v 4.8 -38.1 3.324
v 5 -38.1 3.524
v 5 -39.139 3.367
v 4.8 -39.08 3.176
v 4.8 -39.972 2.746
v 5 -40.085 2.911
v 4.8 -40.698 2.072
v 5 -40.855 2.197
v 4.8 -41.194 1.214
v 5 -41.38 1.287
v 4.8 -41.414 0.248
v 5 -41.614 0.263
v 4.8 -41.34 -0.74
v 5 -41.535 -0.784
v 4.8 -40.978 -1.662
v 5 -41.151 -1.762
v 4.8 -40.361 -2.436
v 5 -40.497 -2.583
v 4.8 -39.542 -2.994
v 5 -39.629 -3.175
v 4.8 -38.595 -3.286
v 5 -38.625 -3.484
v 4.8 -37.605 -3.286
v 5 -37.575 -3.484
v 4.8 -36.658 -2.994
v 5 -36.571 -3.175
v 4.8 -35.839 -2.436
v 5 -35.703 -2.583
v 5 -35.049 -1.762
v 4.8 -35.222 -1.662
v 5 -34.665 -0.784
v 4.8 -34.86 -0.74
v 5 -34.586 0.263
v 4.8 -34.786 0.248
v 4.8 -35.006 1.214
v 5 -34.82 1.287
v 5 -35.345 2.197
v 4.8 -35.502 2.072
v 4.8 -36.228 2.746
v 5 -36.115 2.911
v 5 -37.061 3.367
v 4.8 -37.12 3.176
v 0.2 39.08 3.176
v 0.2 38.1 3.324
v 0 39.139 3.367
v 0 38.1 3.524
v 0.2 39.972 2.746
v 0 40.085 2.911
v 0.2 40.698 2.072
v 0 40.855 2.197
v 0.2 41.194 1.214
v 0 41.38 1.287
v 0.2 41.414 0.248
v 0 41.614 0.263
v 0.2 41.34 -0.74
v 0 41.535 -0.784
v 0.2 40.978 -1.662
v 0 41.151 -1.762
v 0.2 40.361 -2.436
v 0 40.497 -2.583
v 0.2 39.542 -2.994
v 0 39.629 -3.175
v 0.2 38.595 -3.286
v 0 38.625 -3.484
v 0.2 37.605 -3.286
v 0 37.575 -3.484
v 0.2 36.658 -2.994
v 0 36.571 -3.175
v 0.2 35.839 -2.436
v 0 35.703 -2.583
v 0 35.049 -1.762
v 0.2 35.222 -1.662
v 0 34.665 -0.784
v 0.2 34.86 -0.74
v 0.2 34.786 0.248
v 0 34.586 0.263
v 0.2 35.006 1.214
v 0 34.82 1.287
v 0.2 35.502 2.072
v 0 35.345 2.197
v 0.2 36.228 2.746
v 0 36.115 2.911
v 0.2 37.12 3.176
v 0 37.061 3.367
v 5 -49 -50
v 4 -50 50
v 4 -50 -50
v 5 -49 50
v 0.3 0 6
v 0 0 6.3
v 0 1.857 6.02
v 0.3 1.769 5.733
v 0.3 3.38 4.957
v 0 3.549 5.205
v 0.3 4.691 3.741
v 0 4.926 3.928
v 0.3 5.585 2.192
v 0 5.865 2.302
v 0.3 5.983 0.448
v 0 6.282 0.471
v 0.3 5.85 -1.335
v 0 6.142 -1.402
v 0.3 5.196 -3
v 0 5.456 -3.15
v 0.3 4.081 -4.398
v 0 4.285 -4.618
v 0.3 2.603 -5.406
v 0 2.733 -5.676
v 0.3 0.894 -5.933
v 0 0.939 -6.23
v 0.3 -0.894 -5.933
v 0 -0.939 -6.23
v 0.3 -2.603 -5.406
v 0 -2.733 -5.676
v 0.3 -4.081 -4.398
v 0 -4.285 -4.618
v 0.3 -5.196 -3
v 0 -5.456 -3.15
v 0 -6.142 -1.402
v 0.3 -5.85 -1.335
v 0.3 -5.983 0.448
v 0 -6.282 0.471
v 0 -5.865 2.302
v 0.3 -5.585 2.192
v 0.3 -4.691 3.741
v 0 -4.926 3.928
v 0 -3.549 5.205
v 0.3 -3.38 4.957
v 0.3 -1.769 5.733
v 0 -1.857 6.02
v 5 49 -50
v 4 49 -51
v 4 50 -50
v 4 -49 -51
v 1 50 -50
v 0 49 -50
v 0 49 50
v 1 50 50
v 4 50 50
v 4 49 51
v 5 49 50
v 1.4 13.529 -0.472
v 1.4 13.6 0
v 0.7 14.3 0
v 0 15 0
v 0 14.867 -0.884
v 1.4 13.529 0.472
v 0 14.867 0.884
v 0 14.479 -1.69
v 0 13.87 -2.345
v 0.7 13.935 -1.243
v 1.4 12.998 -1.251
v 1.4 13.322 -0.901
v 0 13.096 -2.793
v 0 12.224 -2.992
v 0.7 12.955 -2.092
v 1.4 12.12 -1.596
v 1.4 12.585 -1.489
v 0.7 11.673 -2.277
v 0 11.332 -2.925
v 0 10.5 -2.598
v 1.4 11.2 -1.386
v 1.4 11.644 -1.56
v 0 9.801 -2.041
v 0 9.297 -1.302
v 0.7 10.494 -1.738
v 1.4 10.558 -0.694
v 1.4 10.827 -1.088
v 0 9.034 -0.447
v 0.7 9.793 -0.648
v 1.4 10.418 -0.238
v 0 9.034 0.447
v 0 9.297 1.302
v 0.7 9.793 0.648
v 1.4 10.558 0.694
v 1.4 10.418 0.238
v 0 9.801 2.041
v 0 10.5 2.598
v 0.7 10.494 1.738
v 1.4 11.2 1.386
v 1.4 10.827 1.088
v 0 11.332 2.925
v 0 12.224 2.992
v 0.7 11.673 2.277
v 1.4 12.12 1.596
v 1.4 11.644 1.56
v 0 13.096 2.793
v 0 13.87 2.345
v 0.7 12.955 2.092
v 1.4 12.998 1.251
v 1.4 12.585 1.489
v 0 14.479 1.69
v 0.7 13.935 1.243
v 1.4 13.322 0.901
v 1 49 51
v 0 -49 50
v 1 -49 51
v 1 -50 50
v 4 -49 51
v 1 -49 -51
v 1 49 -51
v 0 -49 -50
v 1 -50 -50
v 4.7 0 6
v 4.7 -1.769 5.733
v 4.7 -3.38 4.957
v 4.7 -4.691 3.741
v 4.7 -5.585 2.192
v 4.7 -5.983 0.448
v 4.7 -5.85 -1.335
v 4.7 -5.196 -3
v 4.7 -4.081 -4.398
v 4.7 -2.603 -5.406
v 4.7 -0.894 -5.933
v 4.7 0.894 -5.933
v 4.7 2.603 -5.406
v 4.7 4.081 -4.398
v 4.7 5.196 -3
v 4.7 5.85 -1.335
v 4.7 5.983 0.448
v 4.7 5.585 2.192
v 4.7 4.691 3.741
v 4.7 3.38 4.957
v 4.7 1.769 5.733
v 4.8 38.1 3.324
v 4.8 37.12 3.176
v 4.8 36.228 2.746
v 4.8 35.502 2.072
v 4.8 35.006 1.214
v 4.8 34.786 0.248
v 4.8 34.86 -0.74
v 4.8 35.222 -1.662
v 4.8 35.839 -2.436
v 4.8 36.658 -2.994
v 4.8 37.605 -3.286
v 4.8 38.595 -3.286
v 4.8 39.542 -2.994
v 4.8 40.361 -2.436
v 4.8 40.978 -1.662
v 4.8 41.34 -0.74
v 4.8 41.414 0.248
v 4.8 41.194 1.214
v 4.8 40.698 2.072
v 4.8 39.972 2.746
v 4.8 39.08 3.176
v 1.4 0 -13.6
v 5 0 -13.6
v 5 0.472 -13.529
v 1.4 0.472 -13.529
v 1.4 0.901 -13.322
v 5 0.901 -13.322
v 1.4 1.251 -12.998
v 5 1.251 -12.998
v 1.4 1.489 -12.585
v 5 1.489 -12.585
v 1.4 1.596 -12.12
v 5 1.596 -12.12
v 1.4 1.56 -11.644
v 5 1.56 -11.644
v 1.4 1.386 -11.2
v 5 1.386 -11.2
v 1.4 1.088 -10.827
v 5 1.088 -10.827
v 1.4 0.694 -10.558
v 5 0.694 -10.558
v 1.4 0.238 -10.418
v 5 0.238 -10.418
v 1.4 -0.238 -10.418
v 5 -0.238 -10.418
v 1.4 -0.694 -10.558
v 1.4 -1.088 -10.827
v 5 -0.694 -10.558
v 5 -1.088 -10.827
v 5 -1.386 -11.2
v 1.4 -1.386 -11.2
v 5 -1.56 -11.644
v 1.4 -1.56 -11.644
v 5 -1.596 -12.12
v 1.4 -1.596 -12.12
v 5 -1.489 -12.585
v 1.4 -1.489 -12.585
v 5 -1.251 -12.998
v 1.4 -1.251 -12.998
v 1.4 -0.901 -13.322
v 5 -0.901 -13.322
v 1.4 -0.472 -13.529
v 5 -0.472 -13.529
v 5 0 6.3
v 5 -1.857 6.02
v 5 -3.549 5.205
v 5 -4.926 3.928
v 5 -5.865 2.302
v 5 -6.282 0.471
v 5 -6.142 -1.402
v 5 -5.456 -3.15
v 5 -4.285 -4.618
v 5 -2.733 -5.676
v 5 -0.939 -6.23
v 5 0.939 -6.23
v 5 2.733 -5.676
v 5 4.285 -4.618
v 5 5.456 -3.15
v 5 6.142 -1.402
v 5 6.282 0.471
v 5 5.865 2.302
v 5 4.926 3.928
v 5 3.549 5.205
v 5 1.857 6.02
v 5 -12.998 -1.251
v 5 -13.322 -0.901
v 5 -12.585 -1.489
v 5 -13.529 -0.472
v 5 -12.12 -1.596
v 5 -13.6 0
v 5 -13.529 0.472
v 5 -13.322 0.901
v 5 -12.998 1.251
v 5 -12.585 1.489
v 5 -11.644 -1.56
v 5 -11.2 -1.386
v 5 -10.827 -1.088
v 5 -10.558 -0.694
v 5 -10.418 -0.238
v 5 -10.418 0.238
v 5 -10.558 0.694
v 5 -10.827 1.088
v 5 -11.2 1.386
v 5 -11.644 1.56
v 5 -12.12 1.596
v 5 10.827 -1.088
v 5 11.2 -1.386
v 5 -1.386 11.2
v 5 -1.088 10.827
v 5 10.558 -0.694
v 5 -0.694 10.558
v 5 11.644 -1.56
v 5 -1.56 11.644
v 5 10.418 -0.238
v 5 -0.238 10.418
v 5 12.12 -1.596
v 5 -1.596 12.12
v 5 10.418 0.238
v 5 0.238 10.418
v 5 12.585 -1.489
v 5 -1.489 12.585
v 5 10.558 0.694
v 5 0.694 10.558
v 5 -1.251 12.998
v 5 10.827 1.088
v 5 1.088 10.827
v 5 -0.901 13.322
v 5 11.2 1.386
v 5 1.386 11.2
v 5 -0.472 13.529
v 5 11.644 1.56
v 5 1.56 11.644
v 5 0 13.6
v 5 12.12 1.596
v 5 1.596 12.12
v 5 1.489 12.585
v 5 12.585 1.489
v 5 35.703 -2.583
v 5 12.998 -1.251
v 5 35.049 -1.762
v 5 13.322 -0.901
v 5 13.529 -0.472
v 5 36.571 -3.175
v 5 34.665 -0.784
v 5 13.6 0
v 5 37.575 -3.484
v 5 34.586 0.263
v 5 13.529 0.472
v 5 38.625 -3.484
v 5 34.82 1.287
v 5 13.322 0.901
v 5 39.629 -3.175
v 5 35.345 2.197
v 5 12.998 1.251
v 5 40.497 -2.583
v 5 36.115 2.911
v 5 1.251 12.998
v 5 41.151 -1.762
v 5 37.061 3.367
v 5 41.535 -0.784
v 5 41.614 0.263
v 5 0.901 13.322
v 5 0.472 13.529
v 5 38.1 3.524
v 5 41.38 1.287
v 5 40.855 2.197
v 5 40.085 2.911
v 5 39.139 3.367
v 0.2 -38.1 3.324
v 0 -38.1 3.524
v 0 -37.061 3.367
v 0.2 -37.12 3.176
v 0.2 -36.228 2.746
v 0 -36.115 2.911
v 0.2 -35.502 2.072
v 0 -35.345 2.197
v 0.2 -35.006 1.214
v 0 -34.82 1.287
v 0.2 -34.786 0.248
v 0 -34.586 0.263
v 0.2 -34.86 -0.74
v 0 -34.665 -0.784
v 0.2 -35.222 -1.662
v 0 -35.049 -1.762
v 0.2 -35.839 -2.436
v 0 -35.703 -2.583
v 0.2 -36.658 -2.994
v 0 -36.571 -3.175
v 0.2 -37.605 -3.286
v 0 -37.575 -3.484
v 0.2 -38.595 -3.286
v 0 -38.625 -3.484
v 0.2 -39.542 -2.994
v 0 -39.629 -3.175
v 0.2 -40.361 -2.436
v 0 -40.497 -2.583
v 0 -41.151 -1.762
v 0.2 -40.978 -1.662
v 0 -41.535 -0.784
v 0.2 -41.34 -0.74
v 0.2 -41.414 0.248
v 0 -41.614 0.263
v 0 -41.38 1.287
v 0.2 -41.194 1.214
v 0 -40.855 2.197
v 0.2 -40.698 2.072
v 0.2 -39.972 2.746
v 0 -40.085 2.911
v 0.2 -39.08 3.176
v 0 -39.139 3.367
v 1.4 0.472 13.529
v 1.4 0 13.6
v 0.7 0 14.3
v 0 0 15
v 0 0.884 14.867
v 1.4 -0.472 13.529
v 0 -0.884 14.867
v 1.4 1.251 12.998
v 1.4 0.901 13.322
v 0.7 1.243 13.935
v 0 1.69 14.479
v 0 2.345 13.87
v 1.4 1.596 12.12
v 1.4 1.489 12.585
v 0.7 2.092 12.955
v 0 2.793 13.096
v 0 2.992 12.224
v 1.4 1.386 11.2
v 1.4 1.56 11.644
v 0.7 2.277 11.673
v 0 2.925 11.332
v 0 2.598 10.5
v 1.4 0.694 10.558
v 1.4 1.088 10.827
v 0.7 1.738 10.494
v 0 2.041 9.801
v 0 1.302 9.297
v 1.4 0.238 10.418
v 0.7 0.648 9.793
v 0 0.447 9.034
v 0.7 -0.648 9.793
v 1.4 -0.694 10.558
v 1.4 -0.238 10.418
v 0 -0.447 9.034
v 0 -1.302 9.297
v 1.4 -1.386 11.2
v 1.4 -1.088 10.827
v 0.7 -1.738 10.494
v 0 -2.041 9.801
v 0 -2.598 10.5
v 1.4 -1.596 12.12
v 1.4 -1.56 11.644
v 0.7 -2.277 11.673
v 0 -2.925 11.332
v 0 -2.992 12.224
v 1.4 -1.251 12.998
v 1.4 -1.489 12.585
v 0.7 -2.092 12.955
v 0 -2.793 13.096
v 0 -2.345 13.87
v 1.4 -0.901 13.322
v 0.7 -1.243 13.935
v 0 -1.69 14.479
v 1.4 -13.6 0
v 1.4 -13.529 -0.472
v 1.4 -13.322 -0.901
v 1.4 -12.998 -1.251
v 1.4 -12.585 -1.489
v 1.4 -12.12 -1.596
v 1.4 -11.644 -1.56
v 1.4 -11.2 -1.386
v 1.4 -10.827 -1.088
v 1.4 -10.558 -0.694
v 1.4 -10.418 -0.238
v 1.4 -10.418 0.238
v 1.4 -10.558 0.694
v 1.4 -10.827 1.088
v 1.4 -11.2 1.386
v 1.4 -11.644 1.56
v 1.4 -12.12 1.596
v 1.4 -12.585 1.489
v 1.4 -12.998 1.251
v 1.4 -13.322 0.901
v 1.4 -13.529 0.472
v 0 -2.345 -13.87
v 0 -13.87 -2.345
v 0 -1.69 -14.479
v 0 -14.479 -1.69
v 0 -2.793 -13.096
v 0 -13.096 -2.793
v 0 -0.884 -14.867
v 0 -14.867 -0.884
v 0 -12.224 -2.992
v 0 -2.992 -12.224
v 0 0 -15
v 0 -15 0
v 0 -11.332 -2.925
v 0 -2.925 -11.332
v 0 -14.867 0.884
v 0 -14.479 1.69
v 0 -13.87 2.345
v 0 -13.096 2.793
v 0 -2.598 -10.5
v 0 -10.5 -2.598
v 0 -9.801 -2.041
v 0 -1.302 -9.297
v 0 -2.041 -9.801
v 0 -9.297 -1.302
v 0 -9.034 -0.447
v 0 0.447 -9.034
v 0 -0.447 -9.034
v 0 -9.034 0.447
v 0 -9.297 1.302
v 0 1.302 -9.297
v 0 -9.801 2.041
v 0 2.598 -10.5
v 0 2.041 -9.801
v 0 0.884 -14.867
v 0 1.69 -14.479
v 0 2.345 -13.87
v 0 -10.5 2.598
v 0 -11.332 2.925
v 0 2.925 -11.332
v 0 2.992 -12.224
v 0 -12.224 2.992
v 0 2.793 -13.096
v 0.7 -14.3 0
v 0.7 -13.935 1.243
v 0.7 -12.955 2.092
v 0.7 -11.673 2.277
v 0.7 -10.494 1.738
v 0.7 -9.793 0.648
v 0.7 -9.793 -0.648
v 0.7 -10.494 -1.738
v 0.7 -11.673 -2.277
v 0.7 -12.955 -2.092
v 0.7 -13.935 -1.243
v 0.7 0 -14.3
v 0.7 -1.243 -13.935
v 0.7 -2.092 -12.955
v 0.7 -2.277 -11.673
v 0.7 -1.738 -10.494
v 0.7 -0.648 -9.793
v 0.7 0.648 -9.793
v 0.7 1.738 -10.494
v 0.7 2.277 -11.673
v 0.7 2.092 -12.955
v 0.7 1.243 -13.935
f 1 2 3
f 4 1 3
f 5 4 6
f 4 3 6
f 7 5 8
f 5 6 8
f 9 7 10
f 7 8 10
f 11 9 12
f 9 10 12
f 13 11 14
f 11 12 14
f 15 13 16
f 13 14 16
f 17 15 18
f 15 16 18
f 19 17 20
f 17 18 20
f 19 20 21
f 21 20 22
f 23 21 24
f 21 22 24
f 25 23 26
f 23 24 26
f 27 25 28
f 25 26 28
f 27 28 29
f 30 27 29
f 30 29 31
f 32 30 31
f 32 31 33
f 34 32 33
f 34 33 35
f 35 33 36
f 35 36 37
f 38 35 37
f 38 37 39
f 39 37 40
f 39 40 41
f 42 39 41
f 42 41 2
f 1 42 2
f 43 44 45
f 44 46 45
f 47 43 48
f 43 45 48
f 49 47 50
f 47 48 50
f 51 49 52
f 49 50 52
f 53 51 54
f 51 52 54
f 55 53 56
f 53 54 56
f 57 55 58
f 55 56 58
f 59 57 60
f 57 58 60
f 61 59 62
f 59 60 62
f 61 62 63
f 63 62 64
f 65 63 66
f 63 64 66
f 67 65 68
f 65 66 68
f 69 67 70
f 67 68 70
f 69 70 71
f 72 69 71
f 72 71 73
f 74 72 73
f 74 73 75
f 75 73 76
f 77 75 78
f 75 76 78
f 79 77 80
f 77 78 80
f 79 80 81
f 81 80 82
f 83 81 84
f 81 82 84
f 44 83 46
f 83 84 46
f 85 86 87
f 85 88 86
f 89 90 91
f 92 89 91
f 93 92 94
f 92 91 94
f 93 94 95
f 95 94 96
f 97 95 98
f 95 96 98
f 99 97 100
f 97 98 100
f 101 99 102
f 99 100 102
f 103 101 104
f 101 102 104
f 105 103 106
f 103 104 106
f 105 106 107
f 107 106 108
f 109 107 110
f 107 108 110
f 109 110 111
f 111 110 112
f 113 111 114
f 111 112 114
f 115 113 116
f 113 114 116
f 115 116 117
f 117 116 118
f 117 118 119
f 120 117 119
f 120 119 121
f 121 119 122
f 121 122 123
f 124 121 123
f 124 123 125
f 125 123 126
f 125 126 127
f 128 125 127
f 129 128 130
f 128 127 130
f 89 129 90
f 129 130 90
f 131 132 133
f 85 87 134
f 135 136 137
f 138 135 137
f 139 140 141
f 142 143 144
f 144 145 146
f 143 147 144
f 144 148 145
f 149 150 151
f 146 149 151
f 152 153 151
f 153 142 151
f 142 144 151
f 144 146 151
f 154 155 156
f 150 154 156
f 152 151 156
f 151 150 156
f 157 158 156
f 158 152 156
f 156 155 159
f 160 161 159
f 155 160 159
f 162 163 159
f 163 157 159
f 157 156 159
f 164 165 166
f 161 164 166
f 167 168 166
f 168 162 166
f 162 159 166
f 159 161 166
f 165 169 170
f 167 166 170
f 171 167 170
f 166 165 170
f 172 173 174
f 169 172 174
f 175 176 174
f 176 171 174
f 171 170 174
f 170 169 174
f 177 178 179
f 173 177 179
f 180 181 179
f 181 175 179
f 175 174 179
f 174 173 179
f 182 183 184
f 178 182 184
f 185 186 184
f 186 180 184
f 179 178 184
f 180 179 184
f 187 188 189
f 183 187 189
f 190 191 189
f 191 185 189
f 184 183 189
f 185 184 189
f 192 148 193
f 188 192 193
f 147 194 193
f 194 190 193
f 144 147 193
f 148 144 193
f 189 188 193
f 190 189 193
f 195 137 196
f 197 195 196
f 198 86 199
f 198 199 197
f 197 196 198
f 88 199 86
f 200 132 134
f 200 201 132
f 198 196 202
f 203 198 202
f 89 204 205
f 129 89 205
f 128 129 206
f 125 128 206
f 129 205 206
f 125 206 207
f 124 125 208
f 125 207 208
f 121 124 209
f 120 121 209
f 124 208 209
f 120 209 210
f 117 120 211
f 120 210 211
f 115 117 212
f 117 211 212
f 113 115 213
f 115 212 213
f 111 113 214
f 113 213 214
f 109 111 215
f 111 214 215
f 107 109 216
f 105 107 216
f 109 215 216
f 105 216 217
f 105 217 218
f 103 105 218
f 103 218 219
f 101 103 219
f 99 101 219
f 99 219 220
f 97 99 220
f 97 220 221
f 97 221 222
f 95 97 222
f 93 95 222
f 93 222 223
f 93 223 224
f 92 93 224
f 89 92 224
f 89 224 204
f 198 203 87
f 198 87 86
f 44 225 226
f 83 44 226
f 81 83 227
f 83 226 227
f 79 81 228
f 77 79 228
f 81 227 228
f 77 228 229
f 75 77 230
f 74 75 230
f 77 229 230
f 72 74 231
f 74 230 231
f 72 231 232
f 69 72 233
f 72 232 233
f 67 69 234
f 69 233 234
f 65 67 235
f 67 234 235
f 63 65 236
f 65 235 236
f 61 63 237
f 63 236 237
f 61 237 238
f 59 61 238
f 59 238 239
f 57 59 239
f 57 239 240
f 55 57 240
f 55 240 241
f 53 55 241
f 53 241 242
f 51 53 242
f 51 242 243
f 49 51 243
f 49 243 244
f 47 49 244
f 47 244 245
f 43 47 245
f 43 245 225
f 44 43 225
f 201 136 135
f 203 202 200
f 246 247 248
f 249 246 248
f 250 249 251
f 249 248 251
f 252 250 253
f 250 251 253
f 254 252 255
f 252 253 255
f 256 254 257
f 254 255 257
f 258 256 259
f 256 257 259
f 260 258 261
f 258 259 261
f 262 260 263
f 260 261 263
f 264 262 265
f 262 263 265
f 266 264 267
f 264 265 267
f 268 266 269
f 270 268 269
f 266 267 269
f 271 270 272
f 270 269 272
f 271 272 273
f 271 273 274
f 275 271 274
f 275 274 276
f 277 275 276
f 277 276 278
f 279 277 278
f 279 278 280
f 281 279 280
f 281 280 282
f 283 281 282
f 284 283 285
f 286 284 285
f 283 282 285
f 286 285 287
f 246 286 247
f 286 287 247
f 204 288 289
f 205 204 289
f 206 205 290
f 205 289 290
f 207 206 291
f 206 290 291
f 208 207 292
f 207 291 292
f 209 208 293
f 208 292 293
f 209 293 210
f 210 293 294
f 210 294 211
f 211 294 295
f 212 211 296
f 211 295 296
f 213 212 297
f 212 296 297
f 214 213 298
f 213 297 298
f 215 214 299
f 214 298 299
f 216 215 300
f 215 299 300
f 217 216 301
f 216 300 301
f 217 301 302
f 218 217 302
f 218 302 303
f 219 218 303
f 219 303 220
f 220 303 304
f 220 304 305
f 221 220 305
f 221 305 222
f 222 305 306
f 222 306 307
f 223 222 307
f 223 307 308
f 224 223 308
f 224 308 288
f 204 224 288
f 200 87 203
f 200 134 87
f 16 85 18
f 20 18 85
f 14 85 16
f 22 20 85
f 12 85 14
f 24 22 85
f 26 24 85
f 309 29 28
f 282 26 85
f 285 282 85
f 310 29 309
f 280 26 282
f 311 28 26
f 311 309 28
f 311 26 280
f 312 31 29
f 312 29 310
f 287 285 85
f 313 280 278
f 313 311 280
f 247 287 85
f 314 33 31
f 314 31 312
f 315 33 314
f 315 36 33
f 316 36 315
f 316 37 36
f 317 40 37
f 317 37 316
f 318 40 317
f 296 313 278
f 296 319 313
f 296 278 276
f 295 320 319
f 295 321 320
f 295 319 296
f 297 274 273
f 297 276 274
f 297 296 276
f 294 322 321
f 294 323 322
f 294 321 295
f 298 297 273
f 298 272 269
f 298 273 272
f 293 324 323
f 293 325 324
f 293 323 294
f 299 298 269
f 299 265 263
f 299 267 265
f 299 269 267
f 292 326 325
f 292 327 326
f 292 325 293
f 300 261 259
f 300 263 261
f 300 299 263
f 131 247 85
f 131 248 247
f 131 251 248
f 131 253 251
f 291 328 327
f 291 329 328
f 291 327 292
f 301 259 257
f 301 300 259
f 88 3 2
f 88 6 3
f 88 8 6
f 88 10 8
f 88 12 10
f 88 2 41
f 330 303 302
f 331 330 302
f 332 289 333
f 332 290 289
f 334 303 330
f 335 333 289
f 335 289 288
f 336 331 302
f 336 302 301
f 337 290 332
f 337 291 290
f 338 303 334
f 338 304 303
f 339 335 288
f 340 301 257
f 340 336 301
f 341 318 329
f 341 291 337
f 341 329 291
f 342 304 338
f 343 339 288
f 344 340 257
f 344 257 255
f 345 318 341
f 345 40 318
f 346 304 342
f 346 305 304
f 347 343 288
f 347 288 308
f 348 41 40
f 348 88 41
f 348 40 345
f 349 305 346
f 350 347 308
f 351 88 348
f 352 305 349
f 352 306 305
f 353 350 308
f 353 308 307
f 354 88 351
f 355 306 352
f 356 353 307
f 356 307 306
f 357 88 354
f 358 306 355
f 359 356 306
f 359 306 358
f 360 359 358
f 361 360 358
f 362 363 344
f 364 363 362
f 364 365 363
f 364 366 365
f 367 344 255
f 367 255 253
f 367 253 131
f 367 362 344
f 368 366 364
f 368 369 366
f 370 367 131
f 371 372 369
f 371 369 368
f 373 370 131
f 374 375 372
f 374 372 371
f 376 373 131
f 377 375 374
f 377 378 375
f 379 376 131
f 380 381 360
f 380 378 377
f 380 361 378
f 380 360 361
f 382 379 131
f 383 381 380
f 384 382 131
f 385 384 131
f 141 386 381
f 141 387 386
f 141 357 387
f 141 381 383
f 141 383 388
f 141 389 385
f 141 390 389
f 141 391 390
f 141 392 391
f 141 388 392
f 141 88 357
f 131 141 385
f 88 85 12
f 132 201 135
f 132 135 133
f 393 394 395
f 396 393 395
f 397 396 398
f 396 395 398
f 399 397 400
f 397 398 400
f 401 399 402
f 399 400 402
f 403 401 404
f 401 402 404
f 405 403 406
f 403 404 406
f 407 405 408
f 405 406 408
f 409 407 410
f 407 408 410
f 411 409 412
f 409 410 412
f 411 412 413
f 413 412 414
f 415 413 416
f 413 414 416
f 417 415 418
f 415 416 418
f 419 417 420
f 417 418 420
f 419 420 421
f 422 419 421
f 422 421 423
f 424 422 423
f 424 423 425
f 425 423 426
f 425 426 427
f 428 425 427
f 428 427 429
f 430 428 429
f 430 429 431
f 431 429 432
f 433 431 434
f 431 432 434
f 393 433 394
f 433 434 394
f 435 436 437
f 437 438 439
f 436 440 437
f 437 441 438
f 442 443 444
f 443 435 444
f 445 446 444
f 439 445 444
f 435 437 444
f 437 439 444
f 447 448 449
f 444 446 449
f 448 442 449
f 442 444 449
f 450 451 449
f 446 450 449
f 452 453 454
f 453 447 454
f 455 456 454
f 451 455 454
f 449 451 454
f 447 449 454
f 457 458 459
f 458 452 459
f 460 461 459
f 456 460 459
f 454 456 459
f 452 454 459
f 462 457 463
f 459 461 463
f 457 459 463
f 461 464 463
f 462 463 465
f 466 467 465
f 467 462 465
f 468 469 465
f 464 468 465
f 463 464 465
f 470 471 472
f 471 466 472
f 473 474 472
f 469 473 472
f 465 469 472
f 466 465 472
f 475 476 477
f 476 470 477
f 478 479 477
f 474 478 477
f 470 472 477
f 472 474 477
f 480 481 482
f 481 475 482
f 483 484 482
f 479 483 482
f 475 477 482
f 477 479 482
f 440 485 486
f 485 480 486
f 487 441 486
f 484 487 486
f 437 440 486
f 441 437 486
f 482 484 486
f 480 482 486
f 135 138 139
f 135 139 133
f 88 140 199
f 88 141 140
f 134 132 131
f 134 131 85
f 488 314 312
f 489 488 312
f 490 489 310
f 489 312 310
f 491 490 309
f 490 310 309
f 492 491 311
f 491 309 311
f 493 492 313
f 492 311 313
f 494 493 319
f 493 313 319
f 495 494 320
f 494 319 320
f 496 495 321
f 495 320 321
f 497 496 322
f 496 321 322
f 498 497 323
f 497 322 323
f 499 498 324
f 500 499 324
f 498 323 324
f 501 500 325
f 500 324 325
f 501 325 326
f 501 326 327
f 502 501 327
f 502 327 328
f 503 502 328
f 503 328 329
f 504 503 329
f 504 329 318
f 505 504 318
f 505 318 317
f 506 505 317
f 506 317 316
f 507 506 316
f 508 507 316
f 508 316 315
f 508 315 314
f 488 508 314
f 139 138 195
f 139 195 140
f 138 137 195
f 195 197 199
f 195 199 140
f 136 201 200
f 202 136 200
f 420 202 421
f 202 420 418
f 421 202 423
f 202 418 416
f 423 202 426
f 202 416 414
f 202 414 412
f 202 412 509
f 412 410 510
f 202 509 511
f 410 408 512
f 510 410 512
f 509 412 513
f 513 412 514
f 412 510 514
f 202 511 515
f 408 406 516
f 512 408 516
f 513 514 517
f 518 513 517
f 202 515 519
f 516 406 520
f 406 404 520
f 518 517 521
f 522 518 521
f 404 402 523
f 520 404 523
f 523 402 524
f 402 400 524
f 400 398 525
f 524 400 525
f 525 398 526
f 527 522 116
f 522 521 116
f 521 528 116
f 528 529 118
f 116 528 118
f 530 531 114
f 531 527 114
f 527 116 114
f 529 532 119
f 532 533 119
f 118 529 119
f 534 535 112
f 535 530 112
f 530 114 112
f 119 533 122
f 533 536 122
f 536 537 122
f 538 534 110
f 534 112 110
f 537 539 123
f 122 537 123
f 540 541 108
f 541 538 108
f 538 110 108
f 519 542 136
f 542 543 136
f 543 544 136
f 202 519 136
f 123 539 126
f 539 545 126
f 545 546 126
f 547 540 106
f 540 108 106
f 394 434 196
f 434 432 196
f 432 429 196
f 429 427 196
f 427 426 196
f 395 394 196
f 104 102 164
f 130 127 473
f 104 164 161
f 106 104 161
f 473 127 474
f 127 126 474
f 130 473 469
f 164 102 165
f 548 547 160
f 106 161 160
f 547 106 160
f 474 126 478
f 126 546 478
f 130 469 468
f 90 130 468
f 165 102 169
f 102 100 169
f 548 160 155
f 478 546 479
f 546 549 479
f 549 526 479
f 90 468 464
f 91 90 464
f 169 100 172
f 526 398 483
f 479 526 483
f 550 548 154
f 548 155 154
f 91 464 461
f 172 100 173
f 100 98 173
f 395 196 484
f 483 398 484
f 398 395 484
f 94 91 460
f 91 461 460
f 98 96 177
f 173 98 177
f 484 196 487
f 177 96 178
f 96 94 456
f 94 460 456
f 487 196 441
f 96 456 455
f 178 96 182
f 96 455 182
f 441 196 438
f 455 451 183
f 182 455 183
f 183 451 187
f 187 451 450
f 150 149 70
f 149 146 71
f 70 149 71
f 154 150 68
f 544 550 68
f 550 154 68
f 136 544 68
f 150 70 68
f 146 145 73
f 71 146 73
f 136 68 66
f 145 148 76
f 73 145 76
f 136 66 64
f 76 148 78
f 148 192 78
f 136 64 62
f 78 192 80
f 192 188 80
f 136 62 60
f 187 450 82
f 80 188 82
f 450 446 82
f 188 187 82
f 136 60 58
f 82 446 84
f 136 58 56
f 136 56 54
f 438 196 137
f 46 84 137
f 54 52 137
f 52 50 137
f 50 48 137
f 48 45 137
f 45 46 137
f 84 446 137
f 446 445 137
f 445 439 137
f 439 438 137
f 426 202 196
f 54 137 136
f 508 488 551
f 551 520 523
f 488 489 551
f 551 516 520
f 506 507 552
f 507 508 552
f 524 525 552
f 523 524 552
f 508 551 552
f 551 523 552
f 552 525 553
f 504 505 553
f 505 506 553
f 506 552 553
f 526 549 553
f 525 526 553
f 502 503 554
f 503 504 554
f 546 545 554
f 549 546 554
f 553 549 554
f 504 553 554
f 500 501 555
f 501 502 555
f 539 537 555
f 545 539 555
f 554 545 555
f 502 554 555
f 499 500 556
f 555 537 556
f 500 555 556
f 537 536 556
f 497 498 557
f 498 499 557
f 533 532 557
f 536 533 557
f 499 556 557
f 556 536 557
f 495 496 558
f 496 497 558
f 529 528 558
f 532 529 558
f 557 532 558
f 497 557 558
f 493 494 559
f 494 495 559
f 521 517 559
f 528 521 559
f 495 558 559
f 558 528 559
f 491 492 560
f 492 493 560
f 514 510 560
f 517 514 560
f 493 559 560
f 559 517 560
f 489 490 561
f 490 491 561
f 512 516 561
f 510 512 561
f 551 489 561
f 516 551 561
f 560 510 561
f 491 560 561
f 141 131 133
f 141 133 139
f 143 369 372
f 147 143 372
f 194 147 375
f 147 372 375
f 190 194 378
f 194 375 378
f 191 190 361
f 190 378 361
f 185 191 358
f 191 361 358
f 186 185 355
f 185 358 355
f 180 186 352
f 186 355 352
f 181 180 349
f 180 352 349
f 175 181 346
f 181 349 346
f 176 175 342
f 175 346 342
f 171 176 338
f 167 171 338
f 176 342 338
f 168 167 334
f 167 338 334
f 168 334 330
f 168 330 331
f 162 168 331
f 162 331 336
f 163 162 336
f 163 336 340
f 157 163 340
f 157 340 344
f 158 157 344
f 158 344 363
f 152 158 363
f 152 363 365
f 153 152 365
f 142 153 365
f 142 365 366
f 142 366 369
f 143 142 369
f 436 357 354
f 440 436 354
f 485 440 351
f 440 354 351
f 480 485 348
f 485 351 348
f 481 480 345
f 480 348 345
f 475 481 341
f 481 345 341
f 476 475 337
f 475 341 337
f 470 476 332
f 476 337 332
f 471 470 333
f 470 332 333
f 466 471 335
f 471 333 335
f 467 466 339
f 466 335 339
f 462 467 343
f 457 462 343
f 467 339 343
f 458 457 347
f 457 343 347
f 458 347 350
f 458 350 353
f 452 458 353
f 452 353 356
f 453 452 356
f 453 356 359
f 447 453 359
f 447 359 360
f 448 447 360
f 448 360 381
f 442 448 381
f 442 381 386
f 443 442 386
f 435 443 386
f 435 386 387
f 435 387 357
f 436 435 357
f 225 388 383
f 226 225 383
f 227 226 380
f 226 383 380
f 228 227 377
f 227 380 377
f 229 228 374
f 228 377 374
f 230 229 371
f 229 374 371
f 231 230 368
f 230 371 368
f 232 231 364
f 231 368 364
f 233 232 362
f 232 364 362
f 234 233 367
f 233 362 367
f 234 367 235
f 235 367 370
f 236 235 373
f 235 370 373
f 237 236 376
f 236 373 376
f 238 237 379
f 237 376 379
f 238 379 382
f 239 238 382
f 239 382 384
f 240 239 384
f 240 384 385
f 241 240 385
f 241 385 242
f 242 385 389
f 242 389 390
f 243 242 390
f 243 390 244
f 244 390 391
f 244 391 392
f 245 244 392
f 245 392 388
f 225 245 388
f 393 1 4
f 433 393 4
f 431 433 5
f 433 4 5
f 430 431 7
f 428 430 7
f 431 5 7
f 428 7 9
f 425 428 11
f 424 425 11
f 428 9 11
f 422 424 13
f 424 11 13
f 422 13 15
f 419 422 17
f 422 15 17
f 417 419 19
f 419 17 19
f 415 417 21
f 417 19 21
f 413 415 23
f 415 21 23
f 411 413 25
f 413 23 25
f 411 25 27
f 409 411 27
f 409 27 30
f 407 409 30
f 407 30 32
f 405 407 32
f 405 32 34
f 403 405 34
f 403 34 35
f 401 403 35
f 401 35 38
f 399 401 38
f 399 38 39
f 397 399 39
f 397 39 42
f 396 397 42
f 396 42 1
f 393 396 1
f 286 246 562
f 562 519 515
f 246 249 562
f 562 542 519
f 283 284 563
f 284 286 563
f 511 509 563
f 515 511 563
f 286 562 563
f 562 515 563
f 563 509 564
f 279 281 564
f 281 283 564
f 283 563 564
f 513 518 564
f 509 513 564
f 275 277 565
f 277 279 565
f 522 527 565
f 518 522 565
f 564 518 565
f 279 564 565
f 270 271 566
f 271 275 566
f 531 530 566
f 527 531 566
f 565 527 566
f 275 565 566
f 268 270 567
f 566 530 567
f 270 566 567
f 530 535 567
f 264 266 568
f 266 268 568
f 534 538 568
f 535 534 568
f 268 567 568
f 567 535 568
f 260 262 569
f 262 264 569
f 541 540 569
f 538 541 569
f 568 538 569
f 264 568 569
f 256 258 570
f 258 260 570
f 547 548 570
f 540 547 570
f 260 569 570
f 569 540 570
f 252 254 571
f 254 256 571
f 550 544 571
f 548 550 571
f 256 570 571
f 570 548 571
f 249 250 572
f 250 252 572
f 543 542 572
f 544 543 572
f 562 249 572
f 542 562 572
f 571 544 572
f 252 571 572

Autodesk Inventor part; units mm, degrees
ref_plane "YZ Plane" through (0, 0, 0) normal (1, 0, 0) x (0, 1, 0)
ref_plane "XZ Plane" through (0, 0, 0) normal (0, 1, 0) x (-1, 0, 0)
ref_plane "XY Plane" through (0, 0, 0) normal (0, 0, 1) x (1, 0, 0)
sketch "Sketch1" plane through (0, 0, 0) normal (1, 0, 0) x (0, 1, 0)
  point P0 (0, 0)
  point P1 (0, 12)
  dimension "d0" = 12
sketch "Sketch2" plane through (0, 0, 0) normal (1, 0, 0) x (0, 1, 0)
  line L0 (-50, 51) -> (50, 51)
  line L1 (50, 51) -> (50, -51)
  line L2 (50, -51) -> (-50, -51)
  line L3 (-50, -51) -> (-50, 51)
  line L4 (-50, 51) -> (50, -51) construction
  line L5 (50, 51) -> (-50, -51) construction
  point P0 (0, 0)
  dimension "d1" = 100
  dimension "d2" = 102
extrude "Extrusion1" add sketch "Sketch2" along normal blind 5
hole "Hole1" at (0, 0, 12) direction (1, 0, 0) diameter 3.2 end through all countersink diameter 6 countersink angle 90
pattern_circular "Circular Pattern1" count 4 over 360 about axis through (-10, 0, 0) along (1, 0, 0) of "Hole1"
sketch "Sketch3" plane through (0, 0, 0) normal (-1, 0, 0) x (0, 0, 1)
  point P0 (0, 0)
  point P1 (0, 38.1)
  point P2 (0, -38.1)
  dimension "d15" = 38.1
  dimension "d16" = 38.1
hole "Hole2" at (0, -38.1, 0) at (0, 38.1, 0) direction (1, 0, 0) diameter 6.647 end through all thread size "M8x1.25" class "6H" standard "ISO Metric profile"
chamfer "Chamfer1" distance 1 angle 45 12 edges at (0, 0, -51) (0, -50, 0) (0, 0, 51) (0, 50, 0) (2.5, 50, 51) (5, 0, 51) (2.5, -50, 51) (5, -50, 0) (2.5, -50, -51) (5, 0, -51) (2.5, 50, -51) (5, 50, 0)
sketch "Sketch4" plane through (0, 0, 0) normal (-1, 0, 0) x (0, 0, 1)
  point P0 (0, 0)
  point P1 (0, 0)
hole "Hole3" at (0, 0, 0) direction (1, 0, 0) diameter 12 depth 10 tip angle 118
chamfer "Chamfer3" distance 0.2 angle 45 4 edges at (0, -38.1, -3.3235) (0, 38.1, -3.3235) (5, -38.1, -3.3235) (5, 38.1, -3.3235)
chamfer "Chamfer4" distance 0.3 angle 45 2 edges at (0, 0, -6) (5, 0, -6)
properties part number "plytkaadaptacyjna" material "Stainless Steel"
